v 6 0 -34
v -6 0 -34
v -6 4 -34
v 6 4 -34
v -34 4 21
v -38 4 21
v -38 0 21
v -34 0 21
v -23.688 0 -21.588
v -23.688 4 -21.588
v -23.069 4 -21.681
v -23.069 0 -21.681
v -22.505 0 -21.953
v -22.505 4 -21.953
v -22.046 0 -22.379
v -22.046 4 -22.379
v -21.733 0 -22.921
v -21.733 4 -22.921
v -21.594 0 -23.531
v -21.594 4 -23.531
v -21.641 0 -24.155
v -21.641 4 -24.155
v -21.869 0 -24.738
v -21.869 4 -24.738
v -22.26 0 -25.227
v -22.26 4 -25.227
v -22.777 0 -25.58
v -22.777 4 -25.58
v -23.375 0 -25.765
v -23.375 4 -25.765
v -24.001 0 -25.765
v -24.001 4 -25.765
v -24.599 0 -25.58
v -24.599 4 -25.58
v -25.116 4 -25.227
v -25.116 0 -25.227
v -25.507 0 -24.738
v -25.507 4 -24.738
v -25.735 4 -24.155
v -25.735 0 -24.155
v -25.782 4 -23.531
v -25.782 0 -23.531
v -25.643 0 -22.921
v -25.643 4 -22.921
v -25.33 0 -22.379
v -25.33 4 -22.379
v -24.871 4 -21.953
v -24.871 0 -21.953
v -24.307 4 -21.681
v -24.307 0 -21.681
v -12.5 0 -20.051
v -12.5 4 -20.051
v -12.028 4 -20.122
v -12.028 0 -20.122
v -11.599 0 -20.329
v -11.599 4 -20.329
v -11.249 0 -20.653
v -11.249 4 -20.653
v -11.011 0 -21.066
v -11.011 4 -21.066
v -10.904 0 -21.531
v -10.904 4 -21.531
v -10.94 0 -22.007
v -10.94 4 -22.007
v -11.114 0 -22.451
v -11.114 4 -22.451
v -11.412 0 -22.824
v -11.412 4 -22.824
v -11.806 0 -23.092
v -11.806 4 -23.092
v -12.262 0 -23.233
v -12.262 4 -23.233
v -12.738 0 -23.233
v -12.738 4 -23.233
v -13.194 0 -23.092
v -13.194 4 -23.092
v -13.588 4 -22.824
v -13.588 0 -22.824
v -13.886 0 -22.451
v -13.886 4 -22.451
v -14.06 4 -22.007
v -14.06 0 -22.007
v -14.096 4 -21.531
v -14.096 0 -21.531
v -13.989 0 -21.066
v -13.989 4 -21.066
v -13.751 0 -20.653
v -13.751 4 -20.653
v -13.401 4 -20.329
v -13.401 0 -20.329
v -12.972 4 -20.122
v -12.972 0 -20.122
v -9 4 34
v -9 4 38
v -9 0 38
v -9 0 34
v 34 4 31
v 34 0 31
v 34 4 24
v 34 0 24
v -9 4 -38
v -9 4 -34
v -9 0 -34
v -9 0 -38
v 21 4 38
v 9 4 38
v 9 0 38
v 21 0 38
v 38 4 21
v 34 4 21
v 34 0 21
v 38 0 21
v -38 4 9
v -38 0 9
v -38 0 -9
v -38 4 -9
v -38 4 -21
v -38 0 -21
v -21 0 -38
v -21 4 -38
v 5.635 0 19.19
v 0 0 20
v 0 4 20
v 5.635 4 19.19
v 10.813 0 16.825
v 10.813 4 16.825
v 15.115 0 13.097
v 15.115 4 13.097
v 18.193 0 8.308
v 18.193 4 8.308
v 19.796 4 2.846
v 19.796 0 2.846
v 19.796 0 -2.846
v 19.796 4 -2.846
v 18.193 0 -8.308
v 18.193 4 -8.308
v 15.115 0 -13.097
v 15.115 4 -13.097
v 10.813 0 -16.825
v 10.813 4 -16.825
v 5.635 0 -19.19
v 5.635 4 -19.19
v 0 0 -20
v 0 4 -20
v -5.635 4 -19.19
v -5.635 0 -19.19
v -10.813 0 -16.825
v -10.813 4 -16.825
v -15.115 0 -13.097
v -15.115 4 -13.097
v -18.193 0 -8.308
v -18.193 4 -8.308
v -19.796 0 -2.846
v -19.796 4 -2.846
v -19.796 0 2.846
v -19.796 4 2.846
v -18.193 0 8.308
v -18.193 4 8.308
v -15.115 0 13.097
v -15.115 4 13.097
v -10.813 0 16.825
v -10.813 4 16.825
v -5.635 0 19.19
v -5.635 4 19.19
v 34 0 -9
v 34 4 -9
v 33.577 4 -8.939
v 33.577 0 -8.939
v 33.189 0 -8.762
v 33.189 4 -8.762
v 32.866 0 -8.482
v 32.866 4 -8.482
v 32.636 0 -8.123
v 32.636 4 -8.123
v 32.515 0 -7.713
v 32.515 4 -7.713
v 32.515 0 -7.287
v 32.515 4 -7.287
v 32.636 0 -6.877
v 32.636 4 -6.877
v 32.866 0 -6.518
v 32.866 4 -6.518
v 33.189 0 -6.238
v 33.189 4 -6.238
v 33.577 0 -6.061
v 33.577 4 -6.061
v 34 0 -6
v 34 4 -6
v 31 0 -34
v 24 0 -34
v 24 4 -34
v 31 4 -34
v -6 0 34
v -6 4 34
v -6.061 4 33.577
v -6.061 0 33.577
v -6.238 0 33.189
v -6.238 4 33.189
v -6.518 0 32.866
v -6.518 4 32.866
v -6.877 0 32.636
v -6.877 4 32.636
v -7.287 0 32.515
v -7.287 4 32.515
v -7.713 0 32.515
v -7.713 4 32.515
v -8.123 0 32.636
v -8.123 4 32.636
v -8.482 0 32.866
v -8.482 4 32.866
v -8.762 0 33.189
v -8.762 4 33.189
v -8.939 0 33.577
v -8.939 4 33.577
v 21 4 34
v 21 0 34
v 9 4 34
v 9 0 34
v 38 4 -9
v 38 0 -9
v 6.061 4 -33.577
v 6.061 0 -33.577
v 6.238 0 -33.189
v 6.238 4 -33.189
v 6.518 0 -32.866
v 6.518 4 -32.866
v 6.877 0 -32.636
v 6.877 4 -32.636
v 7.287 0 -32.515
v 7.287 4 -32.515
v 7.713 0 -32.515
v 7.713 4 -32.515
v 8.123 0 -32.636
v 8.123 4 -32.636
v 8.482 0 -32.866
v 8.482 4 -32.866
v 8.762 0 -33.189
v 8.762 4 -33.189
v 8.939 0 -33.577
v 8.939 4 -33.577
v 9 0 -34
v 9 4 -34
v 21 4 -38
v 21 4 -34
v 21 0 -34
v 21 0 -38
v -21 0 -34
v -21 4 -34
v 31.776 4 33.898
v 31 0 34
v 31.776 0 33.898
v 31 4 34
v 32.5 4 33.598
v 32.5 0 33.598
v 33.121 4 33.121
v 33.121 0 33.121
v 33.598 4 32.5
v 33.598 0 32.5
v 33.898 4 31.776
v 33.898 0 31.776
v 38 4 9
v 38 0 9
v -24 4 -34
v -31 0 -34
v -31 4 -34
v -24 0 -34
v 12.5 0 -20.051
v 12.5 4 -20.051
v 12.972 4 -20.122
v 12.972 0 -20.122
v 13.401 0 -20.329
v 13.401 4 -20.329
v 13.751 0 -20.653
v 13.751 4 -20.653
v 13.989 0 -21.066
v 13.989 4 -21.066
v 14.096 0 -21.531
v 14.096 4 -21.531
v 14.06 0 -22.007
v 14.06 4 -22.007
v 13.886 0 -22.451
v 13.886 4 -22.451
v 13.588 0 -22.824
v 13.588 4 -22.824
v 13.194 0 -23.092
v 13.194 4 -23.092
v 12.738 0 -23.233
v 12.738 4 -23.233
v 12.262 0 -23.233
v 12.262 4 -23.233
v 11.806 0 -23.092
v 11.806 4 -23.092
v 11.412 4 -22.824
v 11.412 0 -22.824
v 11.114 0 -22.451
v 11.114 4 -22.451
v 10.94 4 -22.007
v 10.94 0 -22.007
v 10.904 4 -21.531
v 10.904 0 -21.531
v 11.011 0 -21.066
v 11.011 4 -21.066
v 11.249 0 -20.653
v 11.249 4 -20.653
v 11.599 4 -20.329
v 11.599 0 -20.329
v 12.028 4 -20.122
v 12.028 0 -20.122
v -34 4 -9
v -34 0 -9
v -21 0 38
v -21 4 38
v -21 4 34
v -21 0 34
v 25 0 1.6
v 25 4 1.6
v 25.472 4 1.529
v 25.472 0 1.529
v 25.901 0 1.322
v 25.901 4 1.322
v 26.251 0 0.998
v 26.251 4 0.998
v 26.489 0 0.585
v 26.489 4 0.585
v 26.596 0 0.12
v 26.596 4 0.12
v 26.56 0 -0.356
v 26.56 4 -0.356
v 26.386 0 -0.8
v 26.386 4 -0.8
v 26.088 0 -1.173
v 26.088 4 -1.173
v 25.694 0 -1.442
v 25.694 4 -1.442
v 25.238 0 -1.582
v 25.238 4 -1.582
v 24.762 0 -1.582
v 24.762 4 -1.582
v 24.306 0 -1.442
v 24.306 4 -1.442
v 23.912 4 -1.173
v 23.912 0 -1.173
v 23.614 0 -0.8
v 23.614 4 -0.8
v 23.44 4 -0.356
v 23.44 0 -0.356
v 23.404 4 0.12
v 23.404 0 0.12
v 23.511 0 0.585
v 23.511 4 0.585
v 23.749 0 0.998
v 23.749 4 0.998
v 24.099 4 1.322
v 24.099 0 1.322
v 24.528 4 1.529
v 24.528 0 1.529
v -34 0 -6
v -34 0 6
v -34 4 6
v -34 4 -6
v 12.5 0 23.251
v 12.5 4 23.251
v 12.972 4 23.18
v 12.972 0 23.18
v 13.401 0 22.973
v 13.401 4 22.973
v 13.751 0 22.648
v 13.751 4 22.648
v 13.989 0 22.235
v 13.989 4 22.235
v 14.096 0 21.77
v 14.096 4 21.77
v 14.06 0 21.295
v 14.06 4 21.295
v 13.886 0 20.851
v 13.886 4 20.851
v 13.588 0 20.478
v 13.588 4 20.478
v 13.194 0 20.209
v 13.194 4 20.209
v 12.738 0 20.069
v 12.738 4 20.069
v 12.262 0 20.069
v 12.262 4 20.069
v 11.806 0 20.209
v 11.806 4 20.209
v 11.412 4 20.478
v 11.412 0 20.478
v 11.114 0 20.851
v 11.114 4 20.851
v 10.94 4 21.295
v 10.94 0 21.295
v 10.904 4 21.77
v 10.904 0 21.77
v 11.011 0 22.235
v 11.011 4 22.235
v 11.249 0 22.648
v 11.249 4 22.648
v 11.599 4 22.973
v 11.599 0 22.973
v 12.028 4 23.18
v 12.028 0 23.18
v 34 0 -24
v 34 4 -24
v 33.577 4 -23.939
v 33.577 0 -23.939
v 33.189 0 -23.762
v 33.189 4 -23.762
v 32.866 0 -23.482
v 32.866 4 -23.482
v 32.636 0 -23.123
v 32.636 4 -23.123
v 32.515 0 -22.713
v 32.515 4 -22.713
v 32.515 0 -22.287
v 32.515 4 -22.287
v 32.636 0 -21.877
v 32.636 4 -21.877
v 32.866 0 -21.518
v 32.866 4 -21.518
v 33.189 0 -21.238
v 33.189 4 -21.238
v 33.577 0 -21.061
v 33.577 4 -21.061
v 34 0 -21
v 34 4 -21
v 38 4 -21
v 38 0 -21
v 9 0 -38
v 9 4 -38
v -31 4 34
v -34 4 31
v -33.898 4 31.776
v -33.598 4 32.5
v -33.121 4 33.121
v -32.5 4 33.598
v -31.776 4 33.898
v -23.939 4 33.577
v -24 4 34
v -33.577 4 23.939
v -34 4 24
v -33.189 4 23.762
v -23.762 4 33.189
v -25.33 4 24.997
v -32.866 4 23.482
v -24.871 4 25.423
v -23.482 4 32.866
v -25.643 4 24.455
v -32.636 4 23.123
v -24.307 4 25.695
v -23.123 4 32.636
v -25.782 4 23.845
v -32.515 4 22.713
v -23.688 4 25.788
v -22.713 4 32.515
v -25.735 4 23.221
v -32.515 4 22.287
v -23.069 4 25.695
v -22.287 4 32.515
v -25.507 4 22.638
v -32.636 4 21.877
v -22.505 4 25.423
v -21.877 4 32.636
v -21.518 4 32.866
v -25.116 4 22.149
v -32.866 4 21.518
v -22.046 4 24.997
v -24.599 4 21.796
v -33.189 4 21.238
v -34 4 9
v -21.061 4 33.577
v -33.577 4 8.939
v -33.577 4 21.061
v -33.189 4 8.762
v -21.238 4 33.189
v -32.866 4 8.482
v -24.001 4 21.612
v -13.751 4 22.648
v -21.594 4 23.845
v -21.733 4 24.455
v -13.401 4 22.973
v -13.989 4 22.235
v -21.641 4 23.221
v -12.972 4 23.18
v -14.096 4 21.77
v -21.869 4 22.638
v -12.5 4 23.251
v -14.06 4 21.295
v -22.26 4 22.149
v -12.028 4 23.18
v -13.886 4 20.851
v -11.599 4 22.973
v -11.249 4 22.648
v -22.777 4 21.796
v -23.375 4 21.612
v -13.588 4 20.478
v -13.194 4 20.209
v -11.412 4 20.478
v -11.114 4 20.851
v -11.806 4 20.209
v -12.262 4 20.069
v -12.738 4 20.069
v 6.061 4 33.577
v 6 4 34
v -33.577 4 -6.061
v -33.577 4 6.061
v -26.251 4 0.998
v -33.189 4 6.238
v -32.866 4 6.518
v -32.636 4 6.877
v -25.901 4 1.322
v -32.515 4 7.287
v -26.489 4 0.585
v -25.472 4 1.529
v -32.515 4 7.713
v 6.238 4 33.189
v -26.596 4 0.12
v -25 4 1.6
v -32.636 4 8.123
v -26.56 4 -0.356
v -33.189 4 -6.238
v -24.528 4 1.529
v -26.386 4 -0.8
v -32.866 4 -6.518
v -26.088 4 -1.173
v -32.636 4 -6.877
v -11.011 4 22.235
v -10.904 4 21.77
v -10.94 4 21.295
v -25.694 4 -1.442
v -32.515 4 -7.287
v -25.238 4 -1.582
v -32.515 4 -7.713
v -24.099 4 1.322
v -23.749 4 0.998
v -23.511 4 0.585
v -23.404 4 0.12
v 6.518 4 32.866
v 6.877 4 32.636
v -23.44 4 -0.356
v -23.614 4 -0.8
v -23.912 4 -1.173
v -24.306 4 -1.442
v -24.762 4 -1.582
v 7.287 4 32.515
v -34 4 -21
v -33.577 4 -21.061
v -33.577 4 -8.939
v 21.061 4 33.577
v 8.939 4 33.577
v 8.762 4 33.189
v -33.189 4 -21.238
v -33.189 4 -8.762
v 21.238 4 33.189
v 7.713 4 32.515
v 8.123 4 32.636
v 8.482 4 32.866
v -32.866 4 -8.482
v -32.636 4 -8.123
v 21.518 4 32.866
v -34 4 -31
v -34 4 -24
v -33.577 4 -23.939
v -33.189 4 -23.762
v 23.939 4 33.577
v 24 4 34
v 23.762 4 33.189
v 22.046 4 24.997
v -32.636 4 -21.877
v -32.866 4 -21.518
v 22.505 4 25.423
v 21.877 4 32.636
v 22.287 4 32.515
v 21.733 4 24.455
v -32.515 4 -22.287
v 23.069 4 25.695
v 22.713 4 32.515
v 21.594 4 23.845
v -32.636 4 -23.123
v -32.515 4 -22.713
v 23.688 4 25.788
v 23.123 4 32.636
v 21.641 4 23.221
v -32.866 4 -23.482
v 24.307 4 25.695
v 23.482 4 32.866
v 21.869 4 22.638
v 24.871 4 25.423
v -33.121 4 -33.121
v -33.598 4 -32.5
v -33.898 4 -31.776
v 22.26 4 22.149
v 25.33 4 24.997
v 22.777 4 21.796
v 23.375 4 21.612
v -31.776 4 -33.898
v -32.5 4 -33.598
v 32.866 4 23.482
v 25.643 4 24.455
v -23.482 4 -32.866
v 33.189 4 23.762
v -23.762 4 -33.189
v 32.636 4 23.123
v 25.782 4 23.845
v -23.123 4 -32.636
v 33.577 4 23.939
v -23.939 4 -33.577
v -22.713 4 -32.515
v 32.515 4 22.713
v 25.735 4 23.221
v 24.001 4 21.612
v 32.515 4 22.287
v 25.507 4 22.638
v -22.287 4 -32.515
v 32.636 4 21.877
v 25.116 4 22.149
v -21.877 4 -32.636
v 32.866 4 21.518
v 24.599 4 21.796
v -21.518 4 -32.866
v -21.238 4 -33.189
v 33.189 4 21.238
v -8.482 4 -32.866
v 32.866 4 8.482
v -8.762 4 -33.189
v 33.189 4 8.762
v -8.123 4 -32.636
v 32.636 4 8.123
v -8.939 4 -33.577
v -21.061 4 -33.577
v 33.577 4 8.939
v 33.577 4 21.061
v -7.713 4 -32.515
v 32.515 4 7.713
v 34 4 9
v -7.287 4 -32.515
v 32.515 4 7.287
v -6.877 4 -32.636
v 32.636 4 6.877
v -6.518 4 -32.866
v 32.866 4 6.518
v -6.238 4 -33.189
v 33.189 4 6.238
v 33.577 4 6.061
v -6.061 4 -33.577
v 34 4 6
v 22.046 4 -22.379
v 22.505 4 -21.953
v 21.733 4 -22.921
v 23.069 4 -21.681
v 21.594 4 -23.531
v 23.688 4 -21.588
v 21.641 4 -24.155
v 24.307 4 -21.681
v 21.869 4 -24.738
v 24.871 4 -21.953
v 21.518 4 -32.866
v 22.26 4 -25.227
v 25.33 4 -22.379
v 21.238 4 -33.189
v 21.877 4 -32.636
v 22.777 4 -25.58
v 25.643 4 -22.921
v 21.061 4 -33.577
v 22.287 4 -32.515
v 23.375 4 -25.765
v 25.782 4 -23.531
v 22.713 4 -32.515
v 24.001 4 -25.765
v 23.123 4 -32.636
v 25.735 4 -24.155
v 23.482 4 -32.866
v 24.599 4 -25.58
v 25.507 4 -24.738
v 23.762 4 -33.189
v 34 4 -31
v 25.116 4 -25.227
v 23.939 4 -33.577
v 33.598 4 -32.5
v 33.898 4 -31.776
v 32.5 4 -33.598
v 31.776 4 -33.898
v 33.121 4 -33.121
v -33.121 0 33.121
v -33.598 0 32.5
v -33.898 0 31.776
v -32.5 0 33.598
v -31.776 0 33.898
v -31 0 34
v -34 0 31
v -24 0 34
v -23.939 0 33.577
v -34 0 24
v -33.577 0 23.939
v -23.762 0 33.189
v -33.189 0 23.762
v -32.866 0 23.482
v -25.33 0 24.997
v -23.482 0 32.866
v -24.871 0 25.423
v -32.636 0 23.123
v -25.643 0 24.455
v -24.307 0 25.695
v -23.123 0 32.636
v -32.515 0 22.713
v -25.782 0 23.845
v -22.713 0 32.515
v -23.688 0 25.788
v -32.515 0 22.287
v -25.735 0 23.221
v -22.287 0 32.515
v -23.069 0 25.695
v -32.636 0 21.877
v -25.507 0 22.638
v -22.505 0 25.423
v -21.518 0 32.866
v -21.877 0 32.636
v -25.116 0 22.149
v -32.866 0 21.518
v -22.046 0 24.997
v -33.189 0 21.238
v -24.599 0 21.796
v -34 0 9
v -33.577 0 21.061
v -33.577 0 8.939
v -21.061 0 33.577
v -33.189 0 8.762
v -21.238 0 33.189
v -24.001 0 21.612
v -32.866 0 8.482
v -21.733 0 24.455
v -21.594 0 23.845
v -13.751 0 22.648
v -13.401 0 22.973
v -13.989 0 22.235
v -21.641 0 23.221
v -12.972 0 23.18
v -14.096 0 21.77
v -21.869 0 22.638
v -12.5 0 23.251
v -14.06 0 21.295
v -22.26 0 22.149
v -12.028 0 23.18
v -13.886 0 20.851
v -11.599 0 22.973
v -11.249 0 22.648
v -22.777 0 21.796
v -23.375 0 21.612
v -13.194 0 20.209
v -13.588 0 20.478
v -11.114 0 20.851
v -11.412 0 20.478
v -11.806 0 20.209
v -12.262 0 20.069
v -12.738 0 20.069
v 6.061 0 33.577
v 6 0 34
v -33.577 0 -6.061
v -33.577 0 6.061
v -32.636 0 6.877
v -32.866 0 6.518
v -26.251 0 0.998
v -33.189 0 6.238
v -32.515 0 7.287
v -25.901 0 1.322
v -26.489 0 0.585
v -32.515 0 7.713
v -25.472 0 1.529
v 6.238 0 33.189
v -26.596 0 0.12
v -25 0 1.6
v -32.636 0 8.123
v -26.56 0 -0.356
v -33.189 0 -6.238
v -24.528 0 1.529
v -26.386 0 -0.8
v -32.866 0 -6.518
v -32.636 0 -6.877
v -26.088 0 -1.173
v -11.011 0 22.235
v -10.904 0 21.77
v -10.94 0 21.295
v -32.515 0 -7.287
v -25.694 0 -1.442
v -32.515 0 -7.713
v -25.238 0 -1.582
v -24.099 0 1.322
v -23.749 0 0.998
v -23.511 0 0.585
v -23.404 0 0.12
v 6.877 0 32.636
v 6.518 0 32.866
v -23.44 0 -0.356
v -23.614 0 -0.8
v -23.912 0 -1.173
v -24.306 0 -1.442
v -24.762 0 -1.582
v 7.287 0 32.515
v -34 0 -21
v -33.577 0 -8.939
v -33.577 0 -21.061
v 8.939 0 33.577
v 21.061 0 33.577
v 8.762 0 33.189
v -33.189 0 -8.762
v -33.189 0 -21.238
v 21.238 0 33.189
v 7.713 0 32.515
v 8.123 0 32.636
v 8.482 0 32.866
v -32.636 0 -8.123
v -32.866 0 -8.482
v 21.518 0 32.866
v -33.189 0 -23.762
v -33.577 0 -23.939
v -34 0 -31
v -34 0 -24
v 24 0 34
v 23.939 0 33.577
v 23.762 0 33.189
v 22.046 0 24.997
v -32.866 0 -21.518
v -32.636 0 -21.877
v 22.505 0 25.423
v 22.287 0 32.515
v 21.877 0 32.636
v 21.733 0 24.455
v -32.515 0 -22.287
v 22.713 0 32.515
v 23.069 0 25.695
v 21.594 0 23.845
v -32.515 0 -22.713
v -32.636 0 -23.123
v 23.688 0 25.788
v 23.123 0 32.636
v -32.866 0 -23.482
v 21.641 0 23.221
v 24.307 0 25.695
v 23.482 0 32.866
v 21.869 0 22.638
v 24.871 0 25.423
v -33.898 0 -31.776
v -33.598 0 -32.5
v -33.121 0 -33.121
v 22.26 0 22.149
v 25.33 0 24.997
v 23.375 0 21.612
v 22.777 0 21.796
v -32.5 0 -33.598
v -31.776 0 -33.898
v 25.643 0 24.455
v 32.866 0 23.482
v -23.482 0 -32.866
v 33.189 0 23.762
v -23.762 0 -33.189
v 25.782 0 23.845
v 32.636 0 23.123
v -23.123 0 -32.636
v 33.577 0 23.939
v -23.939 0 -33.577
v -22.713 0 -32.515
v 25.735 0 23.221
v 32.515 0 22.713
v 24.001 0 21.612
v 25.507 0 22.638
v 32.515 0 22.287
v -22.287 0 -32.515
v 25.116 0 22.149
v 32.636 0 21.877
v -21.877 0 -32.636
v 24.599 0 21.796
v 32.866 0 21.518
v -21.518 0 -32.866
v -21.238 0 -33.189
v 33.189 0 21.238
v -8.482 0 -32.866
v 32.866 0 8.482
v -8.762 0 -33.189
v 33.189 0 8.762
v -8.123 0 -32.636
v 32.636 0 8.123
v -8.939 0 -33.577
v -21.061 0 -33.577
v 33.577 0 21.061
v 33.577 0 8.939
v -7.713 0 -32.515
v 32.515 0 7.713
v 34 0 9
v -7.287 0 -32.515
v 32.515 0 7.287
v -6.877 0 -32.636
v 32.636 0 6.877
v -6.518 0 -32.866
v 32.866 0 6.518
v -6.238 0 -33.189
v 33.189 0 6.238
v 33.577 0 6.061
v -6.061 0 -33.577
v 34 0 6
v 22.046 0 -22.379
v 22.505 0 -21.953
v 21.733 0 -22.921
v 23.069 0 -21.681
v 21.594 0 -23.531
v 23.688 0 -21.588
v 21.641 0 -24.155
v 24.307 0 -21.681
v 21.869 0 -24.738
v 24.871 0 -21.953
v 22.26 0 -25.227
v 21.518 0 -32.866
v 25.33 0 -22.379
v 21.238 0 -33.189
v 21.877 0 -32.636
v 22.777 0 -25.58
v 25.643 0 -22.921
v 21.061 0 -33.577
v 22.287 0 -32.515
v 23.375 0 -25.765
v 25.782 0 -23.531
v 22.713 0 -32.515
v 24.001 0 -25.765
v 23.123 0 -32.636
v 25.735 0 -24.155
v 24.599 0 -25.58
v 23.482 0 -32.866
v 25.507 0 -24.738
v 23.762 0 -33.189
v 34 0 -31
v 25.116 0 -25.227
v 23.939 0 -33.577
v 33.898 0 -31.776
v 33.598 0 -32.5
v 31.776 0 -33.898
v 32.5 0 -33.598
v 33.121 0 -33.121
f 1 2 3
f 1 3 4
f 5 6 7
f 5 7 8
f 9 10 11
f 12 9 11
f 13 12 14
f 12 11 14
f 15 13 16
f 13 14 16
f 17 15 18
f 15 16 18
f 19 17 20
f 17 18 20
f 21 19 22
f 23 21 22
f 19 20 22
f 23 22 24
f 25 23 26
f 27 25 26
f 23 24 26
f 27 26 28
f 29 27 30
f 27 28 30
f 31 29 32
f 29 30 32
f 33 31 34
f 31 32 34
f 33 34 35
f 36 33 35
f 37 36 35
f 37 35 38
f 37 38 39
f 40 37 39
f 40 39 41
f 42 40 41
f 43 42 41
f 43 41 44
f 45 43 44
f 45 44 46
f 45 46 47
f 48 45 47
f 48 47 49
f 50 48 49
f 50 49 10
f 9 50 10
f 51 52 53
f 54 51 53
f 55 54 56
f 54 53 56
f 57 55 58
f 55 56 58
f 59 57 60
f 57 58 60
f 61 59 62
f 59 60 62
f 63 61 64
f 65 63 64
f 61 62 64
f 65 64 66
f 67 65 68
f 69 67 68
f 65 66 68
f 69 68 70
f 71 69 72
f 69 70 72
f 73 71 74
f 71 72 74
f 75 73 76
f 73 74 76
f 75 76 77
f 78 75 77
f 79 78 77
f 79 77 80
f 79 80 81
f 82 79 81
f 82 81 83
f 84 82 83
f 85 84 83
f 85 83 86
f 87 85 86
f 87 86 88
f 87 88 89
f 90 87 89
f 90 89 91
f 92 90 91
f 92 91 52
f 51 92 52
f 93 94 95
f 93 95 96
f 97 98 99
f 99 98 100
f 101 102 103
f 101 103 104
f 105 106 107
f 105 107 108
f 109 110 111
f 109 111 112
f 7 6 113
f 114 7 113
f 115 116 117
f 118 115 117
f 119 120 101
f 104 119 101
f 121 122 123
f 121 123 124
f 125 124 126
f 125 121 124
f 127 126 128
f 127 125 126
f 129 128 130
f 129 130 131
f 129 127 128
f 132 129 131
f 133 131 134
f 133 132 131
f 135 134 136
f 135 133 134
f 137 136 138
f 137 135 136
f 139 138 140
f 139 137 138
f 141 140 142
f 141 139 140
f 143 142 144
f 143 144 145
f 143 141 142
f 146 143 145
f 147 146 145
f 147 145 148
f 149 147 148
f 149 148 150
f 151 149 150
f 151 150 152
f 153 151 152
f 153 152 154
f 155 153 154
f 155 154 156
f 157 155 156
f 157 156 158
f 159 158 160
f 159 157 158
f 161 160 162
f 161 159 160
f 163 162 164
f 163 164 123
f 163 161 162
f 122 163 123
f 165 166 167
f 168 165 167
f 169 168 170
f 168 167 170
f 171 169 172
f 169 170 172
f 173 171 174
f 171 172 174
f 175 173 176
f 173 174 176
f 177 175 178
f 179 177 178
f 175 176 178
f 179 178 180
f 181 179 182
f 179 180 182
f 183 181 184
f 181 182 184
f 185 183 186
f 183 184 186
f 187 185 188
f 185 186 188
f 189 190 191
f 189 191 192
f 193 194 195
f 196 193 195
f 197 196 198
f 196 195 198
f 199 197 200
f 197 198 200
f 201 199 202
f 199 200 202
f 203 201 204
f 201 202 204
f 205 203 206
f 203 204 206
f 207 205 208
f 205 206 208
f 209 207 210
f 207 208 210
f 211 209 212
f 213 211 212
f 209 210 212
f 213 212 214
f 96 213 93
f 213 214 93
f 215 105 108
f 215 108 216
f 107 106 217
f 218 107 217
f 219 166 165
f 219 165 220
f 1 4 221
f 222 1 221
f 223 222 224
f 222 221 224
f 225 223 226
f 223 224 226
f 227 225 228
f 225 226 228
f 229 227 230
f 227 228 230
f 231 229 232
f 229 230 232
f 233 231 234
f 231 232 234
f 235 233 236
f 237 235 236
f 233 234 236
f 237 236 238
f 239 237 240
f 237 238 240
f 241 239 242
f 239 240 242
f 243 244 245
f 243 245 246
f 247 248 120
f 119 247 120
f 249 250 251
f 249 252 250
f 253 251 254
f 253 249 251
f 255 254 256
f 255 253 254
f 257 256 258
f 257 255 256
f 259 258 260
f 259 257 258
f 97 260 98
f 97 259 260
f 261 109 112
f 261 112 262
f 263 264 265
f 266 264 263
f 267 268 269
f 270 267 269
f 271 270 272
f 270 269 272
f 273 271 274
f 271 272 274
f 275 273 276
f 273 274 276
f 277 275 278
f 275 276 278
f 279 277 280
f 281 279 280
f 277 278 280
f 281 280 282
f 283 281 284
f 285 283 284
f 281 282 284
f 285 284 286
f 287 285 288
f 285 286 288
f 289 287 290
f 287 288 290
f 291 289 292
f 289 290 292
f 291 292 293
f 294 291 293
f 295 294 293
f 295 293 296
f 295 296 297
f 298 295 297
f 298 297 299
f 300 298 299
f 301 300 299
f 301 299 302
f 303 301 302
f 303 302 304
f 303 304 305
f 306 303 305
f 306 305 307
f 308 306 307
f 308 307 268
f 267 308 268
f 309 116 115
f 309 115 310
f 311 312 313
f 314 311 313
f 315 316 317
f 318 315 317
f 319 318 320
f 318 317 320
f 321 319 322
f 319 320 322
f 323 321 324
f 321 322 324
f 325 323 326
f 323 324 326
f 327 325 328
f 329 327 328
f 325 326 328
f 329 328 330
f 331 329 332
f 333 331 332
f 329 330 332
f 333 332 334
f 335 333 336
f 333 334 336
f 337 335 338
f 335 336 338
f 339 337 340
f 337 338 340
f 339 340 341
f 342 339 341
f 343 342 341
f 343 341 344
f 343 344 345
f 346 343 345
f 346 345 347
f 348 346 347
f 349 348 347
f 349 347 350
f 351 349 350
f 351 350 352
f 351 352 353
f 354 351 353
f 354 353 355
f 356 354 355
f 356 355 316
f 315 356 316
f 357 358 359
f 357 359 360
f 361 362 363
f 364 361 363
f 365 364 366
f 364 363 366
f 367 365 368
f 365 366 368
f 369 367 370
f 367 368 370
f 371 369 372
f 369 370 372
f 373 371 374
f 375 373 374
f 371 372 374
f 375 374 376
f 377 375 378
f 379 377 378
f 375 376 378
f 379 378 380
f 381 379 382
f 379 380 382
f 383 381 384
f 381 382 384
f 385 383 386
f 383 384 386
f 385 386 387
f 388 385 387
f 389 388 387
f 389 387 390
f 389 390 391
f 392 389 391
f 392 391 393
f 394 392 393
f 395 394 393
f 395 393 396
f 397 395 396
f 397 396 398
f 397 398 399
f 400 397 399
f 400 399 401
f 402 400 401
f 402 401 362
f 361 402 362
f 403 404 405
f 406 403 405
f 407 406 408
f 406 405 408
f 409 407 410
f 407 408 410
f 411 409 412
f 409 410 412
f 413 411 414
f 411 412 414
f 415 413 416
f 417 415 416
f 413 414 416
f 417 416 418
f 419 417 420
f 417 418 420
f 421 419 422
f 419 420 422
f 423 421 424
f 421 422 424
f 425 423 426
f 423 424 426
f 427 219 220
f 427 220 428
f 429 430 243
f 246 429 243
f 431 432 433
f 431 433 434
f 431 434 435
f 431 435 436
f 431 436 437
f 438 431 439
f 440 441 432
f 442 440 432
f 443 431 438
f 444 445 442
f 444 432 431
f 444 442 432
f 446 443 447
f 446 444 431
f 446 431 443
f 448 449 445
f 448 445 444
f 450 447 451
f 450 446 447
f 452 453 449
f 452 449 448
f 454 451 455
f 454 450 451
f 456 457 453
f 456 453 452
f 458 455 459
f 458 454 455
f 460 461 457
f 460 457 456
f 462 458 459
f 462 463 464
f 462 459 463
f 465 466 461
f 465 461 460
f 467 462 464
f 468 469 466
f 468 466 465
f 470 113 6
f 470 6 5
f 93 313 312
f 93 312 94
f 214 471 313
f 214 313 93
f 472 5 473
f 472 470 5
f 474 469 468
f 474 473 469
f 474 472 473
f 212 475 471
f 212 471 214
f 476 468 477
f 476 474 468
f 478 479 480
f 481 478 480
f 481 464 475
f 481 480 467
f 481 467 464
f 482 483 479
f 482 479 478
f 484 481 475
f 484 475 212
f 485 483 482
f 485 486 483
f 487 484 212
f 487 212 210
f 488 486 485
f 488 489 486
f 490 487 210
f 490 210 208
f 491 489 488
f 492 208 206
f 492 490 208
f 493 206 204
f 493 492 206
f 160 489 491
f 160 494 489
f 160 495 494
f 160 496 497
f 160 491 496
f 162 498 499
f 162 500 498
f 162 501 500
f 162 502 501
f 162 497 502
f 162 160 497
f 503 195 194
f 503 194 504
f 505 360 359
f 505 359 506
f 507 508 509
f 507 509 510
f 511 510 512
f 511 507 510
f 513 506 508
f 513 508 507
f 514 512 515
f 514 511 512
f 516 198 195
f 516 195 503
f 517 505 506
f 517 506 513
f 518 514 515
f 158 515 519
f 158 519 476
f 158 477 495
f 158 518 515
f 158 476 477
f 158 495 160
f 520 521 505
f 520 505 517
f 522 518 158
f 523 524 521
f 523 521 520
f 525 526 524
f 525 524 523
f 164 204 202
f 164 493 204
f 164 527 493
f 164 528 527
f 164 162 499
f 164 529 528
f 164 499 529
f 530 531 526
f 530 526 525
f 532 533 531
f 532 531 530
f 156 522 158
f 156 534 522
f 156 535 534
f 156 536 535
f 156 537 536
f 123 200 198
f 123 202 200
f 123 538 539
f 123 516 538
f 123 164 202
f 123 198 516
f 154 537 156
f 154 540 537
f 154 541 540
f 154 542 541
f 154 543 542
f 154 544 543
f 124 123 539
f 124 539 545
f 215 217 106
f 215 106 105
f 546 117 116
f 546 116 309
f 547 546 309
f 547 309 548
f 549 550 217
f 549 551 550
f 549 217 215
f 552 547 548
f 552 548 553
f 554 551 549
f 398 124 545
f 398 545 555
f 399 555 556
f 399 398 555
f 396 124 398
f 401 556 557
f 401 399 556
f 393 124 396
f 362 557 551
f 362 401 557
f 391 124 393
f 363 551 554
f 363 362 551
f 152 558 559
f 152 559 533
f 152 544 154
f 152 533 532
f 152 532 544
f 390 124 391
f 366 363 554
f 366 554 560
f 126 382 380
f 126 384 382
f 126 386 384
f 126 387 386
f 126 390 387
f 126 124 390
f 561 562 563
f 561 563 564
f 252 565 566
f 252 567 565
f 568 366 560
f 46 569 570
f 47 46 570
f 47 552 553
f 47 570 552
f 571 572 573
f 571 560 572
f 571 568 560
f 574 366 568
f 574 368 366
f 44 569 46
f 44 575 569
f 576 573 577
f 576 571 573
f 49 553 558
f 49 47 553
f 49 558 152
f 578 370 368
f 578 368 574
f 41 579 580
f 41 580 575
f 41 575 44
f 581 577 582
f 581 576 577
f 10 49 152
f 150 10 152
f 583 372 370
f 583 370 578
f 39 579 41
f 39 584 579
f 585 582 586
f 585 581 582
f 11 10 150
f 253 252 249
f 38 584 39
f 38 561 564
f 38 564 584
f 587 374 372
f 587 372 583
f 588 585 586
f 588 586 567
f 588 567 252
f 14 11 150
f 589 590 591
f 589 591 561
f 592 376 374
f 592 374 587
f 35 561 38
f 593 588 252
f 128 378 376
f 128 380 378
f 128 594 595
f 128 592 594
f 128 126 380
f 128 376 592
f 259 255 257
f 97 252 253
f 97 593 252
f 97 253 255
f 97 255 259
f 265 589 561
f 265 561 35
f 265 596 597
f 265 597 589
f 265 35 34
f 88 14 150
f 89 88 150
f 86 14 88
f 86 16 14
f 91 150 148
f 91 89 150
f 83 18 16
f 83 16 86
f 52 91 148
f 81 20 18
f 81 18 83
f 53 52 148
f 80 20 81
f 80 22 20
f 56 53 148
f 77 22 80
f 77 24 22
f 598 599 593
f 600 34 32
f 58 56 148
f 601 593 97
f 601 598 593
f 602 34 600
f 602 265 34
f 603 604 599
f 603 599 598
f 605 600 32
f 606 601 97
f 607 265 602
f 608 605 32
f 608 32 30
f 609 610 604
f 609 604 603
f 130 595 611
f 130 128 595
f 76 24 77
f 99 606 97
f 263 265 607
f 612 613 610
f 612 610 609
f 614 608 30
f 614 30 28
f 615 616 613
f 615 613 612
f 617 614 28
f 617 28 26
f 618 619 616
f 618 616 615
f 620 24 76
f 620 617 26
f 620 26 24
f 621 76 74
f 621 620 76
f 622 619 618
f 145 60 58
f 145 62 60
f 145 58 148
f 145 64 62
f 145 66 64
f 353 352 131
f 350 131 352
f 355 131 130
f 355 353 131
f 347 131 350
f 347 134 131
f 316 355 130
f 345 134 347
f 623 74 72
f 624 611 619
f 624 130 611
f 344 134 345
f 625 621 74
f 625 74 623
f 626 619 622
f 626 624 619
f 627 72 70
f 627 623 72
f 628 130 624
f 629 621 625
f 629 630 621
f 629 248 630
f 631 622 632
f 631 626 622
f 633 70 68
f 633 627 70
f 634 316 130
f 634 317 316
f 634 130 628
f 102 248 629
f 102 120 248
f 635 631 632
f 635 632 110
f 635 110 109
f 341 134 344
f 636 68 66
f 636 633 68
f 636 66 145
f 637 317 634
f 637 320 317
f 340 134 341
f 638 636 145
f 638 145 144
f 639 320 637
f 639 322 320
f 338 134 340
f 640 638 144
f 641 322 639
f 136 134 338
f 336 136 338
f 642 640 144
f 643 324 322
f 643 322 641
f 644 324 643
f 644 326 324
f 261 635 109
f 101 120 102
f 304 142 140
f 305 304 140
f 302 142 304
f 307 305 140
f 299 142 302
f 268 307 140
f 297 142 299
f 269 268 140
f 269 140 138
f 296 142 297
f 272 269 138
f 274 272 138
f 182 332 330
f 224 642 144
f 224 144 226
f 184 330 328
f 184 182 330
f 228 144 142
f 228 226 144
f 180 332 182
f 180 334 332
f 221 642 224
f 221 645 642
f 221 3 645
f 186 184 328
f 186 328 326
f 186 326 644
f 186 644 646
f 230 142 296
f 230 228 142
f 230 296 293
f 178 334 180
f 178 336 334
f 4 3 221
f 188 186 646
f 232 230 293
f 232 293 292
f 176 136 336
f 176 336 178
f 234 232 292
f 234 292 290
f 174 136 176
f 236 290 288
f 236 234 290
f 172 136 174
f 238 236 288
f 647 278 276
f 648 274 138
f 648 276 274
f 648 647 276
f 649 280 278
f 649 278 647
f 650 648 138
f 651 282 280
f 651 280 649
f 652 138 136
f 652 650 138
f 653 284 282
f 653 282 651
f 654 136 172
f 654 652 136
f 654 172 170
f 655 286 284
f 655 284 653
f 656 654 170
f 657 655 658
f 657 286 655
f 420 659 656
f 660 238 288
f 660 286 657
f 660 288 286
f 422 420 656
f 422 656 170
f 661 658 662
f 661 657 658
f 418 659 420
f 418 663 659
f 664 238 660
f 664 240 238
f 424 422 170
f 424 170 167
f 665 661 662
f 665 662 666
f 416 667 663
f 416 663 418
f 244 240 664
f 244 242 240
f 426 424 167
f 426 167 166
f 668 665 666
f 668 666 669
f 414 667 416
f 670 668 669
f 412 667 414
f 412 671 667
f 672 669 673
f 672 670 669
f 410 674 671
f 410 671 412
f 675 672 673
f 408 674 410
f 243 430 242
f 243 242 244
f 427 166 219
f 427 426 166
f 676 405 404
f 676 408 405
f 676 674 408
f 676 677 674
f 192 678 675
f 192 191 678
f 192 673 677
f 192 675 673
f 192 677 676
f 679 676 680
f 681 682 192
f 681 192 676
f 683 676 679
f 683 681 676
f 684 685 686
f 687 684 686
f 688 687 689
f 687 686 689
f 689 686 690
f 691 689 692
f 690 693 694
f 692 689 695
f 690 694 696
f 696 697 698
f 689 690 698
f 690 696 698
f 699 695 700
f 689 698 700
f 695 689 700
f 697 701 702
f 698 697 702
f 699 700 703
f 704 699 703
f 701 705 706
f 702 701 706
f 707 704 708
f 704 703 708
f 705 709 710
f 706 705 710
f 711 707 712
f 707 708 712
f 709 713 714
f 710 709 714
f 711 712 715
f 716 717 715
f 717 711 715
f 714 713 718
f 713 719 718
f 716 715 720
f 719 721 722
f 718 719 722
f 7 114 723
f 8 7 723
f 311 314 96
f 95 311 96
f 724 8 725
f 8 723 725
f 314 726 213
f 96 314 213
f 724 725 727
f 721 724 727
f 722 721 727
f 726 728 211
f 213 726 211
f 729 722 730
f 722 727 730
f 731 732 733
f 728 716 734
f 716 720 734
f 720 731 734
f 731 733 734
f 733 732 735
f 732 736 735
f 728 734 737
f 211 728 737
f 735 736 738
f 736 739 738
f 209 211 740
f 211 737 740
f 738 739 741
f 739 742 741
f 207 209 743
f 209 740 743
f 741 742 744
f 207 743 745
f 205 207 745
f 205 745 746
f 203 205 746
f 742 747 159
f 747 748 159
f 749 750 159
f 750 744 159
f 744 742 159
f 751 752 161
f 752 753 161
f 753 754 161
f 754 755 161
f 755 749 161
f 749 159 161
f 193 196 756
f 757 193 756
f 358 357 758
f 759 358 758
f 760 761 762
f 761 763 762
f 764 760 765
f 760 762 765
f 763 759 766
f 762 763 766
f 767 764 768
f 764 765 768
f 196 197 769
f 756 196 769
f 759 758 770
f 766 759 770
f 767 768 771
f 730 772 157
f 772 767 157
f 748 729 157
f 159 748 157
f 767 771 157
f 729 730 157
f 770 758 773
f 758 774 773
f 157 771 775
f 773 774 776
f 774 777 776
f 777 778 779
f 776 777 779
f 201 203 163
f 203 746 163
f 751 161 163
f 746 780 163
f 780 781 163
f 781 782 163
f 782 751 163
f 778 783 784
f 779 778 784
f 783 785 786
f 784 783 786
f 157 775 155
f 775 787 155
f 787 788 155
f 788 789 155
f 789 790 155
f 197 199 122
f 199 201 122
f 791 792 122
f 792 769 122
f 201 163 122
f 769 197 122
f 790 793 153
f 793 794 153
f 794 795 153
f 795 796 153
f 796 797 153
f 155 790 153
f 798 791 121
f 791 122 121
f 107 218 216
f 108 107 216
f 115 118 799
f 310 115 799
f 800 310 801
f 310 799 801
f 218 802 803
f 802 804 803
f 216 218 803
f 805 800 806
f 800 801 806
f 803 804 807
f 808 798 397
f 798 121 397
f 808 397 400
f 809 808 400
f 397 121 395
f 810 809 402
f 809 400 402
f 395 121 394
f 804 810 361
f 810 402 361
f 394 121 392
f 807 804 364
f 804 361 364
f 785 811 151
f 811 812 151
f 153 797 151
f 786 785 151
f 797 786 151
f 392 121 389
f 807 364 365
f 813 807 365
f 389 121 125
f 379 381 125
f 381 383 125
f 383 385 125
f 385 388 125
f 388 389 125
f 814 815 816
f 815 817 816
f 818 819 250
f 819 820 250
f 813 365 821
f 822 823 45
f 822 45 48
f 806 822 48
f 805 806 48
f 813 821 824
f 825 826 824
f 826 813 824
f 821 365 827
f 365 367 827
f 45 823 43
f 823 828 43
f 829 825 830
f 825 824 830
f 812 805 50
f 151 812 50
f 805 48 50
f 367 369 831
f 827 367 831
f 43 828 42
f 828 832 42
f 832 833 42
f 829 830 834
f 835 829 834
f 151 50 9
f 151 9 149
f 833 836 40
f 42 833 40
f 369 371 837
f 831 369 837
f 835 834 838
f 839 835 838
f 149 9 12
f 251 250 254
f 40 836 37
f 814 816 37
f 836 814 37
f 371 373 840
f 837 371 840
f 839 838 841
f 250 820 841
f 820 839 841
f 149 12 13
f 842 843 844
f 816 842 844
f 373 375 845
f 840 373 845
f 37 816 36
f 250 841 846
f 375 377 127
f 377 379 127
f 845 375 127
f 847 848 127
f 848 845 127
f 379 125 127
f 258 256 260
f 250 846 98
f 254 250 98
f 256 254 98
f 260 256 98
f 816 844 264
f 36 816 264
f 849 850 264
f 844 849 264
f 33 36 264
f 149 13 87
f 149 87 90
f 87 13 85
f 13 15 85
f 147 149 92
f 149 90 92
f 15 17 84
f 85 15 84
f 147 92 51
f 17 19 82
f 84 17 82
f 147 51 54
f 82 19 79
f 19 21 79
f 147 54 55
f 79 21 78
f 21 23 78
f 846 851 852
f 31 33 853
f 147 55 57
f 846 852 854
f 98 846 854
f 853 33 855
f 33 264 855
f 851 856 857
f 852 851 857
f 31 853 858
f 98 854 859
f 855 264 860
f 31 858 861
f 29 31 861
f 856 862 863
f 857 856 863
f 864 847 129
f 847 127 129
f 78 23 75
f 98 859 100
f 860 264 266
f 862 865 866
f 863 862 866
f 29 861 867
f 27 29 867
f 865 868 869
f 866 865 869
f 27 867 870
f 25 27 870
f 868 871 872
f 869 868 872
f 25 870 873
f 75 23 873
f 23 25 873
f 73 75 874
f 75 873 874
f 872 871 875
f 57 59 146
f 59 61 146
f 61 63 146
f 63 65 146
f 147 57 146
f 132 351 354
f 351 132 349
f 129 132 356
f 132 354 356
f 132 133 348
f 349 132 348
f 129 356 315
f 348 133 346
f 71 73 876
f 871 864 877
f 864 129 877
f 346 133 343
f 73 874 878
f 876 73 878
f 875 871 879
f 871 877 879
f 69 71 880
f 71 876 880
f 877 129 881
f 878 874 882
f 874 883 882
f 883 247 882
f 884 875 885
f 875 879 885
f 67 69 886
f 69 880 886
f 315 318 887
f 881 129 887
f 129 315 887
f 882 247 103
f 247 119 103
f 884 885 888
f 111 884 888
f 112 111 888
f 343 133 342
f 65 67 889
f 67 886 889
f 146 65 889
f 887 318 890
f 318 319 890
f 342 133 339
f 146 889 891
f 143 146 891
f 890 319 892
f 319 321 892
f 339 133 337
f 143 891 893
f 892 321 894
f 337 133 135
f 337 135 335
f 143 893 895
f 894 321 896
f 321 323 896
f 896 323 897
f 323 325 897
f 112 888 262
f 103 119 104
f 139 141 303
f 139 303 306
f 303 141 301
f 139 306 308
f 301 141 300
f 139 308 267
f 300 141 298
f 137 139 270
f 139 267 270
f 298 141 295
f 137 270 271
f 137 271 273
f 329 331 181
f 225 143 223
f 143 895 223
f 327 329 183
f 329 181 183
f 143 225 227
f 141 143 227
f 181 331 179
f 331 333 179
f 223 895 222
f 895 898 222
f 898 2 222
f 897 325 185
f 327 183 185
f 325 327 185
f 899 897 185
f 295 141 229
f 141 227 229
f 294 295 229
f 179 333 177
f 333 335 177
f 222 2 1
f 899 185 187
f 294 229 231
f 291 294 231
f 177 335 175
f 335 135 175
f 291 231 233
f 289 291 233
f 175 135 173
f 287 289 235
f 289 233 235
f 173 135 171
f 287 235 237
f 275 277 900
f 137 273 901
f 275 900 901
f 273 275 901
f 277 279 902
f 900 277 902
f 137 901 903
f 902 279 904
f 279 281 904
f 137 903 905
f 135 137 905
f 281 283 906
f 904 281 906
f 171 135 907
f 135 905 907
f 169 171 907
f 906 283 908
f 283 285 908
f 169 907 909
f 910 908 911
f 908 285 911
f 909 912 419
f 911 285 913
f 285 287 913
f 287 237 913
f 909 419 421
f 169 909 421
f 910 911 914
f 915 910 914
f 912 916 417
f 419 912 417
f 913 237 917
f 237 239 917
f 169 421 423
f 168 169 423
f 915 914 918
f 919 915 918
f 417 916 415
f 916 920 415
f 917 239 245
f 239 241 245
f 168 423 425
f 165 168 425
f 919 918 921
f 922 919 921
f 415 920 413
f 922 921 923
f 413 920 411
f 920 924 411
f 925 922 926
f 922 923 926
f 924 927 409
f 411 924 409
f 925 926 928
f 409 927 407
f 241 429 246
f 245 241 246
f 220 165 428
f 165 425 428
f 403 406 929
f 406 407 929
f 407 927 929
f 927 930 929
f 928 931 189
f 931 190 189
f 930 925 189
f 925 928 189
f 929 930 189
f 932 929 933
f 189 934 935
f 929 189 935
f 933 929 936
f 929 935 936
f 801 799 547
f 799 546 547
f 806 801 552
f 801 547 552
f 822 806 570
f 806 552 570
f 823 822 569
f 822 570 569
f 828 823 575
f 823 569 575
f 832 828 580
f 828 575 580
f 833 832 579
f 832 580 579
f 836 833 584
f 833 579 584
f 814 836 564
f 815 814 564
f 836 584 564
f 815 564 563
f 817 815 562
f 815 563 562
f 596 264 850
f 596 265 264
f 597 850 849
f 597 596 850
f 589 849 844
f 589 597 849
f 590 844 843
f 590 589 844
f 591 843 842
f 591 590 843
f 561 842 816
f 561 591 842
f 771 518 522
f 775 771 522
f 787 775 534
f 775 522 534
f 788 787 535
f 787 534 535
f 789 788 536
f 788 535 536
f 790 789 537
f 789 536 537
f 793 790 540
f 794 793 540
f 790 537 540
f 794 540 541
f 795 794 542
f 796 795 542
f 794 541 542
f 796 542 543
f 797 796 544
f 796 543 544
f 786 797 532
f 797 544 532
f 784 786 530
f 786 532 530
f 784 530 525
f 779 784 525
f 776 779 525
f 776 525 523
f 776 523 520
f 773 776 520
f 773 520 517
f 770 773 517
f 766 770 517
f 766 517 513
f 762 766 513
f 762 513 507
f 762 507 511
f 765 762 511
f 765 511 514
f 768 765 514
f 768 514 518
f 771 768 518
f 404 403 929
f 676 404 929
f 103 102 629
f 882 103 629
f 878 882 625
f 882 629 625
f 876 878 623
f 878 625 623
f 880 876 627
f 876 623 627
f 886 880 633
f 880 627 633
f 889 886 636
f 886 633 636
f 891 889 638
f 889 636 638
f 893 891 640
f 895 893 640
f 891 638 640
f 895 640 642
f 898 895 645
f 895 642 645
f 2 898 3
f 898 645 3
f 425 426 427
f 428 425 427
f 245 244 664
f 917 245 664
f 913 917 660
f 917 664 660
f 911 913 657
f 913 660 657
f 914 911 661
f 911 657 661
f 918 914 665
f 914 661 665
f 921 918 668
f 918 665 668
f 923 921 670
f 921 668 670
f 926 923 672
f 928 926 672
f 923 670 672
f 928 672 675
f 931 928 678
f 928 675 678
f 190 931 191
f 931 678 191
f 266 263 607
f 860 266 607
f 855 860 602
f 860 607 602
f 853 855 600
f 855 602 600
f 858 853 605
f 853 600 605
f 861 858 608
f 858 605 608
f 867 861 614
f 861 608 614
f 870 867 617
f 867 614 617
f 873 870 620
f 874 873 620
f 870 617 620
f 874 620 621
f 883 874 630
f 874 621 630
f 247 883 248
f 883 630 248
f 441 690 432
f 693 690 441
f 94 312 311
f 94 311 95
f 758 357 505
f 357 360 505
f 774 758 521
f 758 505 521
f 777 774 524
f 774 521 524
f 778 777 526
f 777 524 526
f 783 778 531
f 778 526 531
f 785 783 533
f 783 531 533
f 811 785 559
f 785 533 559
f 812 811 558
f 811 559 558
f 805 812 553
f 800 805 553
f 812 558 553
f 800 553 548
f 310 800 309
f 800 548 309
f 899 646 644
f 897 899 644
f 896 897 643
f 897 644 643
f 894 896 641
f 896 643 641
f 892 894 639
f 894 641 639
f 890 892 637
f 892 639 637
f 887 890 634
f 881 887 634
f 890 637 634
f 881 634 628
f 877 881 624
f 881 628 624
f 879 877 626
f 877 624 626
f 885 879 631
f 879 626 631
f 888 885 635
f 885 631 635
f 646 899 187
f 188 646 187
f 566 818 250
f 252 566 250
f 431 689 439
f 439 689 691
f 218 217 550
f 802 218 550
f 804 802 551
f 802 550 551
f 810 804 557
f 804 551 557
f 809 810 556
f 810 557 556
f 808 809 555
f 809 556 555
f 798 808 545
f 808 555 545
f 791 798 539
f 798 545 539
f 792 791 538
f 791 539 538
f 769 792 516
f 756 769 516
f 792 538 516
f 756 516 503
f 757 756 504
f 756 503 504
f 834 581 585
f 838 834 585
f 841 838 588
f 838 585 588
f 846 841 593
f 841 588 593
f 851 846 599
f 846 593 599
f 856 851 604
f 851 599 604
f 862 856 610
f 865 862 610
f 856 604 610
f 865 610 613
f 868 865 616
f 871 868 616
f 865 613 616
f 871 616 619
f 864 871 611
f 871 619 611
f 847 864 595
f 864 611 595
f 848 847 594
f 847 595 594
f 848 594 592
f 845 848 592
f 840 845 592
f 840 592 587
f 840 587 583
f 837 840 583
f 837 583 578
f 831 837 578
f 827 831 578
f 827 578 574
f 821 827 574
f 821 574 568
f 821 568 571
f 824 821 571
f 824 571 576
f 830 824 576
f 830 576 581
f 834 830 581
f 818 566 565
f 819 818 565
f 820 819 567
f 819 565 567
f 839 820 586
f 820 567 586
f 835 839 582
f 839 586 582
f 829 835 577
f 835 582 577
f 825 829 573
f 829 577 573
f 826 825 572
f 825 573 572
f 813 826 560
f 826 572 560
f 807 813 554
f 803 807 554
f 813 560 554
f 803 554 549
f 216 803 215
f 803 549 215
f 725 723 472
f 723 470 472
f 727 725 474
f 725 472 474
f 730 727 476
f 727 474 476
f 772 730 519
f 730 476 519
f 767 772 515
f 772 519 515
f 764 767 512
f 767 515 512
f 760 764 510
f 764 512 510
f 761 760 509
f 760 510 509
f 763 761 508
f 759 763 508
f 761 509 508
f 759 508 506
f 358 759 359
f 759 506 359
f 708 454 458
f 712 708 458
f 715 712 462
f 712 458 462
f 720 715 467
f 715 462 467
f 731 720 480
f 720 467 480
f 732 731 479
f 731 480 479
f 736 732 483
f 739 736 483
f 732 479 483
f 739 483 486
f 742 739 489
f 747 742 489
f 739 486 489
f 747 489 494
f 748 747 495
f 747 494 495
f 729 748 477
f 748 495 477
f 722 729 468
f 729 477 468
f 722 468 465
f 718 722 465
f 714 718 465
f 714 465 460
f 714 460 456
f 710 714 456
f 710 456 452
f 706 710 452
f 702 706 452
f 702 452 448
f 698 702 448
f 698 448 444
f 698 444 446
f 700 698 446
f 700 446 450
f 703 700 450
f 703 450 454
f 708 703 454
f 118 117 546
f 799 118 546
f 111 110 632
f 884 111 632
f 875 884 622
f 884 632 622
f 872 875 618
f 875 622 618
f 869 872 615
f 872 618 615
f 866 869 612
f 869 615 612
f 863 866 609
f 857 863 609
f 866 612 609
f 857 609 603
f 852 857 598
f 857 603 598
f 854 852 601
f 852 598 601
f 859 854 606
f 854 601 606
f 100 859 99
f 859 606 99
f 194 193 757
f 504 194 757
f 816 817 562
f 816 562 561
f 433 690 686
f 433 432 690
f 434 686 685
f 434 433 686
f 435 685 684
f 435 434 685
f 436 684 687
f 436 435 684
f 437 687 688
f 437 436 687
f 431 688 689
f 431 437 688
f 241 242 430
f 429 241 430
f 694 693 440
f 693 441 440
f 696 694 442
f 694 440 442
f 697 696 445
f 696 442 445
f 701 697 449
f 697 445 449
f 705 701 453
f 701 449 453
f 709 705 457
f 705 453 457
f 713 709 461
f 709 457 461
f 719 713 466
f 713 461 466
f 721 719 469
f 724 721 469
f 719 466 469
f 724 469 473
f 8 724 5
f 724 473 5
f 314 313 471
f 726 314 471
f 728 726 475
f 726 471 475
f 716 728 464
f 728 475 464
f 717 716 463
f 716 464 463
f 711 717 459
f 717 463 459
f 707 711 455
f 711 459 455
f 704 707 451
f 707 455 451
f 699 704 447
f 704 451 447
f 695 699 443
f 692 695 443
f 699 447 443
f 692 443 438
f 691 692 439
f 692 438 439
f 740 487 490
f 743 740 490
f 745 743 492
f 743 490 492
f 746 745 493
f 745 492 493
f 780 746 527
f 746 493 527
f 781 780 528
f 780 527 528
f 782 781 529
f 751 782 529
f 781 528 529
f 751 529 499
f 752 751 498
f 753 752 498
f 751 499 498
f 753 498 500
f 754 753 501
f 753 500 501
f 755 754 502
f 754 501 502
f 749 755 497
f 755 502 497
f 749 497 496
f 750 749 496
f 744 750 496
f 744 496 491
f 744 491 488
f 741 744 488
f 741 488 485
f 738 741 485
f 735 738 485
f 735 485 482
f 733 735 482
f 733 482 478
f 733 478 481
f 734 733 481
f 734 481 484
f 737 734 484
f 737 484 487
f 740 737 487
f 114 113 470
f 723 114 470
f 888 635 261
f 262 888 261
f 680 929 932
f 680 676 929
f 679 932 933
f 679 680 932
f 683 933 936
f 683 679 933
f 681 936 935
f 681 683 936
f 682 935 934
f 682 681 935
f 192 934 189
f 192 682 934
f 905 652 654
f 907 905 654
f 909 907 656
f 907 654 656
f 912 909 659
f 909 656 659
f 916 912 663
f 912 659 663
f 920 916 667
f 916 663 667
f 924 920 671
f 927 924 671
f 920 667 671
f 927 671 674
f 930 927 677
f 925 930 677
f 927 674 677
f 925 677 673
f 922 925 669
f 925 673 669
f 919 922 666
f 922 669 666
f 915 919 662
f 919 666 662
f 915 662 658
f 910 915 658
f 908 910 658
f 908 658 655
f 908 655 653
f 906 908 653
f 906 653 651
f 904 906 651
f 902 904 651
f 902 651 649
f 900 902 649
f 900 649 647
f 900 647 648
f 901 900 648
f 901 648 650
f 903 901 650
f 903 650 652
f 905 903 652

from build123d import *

# Parameters (mm, degrees)
SKETCH_1_W          = 68
SKETCH_1_H          = 68
SKETCH_1_R          = 20
EXTRUDE_1_DEPTH     = 4
SKETCH_2_W          = 12
SKETCH_2_H          = 4
SKETCH_2_W_2        = 4
SKETCH_2_H_2        = 12
EXTRUDE_2_DEPTH     = 4
SKETCH_3_R          = 1.5
CUT_EXTRUDE_1_DEPTH = 4
FILLET_1_R          = 3
SKETCH_4_R          = 1.6
CUT_EXTRUDE_2_DEPTH = 10
SKETCH_5_R          = 2.1
CUT_EXTRUDE_3_DEPTH = 5


with BuildPart() as part:
    # 草图1 → 凸台-拉伸1 (new body)
    with BuildSketch(Plane(origin=(0, 0, 0), x_dir=(1, 0, 0), z_dir=(0, 1, 0))):
        Rectangle(SKETCH_1_W, SKETCH_1_H)
        with Locations(Location((0, 0, 0), (0, 0, 270))):
            Circle(SKETCH_1_R, mode=Mode.SUBTRACT)
    extrude(amount=EXTRUDE_1_DEPTH)

    # 草图2 → 凸台-拉伸2 (add)
    with BuildSketch(Plane(origin=(0, 4, 0), x_dir=(1, 0, 0), z_dir=(0, 1, 0))):
        with Locations((-15, 36)):
            Rectangle(SKETCH_2_W, SKETCH_2_H)
        with Locations((15, 36)):
            Rectangle(SKETCH_2_W, SKETCH_2_H)
        with Locations((36, 15)):
            Rectangle(SKETCH_2_W_2, SKETCH_2_H_2)
        with Locations((36, -15)):
            Rectangle(SKETCH_2_W_2, SKETCH_2_H_2)
        with Locations((15, -36)):
            Rectangle(SKETCH_2_W, SKETCH_2_H)
        with Locations((-15, -36)):
            Rectangle(SKETCH_2_W, SKETCH_2_H)
        with Locations((-36, -15)):
            Rectangle(SKETCH_2_W_2, SKETCH_2_H_2)
        with Locations((-36, 15)):
            Rectangle(SKETCH_2_W_2, SKETCH_2_H_2)
    extrude(amount=-EXTRUDE_2_DEPTH)

    # 草图3 → 切除-拉伸1 (cut)
    with BuildSketch(Plane(origin=(0, 4, 0), x_dir=(1, 0, 0), z_dir=(0, 1, 0))):
        with Locations((-22.5, 34)):
            Circle(SKETCH_3_R)
        with Locations((-7.5, 34)):
            Circle(SKETCH_3_R)
        with Locations((7.5, 34)):
            Circle(SKETCH_3_R)
        with Locations((22.5, 34)):
            Circle(SKETCH_3_R)
        with Locations((34, 22.5)):
            Circle(SKETCH_3_R)
        with Locations((34, 7.5)):
            Circle(SKETCH_3_R)
        with Locations((34, -7.5)):
            Circle(SKETCH_3_R)
        with Locations((34, -22.5)):
            Circle(SKETCH_3_R)
        with Locations((22.5, -34)):
            Circle(SKETCH_3_R)
        with Locations((7.5, -34)):
            Circle(SKETCH_3_R)
        with Locations((-7.5, -34)):
            Circle(SKETCH_3_R)
        with Locations((-22.5, -34)):
            Circle(SKETCH_3_R)
        with Locations((-34, -22.5)):
            Circle(SKETCH_3_R)
        with Locations((-34, -7.5)):
            Circle(SKETCH_3_R)
        with Locations((-34, 7.5)):
            Circle(SKETCH_3_R)
        with Locations((-34, 22.5)):
            Circle(SKETCH_3_R)
    extrude(amount=-CUT_EXTRUDE_1_DEPTH, mode=Mode.SUBTRACT)

    # 圆角1
    fillet_1_edges = [part.edges().sort_by_distance(p)[0] for p in [
        (34, 2, 34),
        (-34, 2, 34),
        (-34, 2, -34),
        (34, 2, -34),
    ]]
    fillet(fillet_1_edges, radius=FILLET_1_R)

    # 草图4 → 切除-拉伸2 (cut)
    with BuildSketch(Plane(origin=(0, 4, 0), x_dir=(1, 0, 0), z_dir=(0, 1, 0))):
        with Locations(Location((25, 0, 0), (0, 0, 270))):
            Circle(SKETCH_4_R)
        with Locations(Location((12.5, -21.650635095, 0), (0, 0, 270))):
            Circle(SKETCH_4_R)
        with Locations(Location((-12.5, -21.650635095, 0), (0, 0, 270))):
            Circle(SKETCH_4_R)
        with Locations(Location((-25, 0, 0), (0, 0, 270))):
            Circle(SKETCH_4_R)
        with Locations(Location((-12.5, 21.650635095, 0), (0, 0, 270))):
            Circle(SKETCH_4_R)
        with Locations(Location((12.5, 21.650635095, 0), (0, 0, 270))):
            Circle(SKETCH_4_R)
    extrude(amount=-CUT_EXTRUDE_2_DEPTH, mode=Mode.SUBTRACT)

    # 草图5 → 切除-拉伸3 (cut)
    with BuildSketch(Plane(origin=(0, 4, 0), x_dir=(1, 0, 0), z_dir=(0, 1, 0))):
        with Locations(Location((23.68807717, 23.68807717, 0), (0, 0, 270))):
            Circle(SKETCH_5_R)
        with Locations(Location((23.68807717, -23.68807717, 0), (0, 0, 270))):
            Circle(SKETCH_5_R)
        with Locations(Location((-23.68807717, -23.68807717, 0), (0, 0, 270))):
            Circle(SKETCH_5_R)
        with Locations(Location((-23.68807717, 23.68807717, 0), (0, 0, 270))):
            Circle(SKETCH_5_R)
    extrude(amount=-CUT_EXTRUDE_3_DEPTH, mode=Mode.SUBTRACT)


solid = part.part
